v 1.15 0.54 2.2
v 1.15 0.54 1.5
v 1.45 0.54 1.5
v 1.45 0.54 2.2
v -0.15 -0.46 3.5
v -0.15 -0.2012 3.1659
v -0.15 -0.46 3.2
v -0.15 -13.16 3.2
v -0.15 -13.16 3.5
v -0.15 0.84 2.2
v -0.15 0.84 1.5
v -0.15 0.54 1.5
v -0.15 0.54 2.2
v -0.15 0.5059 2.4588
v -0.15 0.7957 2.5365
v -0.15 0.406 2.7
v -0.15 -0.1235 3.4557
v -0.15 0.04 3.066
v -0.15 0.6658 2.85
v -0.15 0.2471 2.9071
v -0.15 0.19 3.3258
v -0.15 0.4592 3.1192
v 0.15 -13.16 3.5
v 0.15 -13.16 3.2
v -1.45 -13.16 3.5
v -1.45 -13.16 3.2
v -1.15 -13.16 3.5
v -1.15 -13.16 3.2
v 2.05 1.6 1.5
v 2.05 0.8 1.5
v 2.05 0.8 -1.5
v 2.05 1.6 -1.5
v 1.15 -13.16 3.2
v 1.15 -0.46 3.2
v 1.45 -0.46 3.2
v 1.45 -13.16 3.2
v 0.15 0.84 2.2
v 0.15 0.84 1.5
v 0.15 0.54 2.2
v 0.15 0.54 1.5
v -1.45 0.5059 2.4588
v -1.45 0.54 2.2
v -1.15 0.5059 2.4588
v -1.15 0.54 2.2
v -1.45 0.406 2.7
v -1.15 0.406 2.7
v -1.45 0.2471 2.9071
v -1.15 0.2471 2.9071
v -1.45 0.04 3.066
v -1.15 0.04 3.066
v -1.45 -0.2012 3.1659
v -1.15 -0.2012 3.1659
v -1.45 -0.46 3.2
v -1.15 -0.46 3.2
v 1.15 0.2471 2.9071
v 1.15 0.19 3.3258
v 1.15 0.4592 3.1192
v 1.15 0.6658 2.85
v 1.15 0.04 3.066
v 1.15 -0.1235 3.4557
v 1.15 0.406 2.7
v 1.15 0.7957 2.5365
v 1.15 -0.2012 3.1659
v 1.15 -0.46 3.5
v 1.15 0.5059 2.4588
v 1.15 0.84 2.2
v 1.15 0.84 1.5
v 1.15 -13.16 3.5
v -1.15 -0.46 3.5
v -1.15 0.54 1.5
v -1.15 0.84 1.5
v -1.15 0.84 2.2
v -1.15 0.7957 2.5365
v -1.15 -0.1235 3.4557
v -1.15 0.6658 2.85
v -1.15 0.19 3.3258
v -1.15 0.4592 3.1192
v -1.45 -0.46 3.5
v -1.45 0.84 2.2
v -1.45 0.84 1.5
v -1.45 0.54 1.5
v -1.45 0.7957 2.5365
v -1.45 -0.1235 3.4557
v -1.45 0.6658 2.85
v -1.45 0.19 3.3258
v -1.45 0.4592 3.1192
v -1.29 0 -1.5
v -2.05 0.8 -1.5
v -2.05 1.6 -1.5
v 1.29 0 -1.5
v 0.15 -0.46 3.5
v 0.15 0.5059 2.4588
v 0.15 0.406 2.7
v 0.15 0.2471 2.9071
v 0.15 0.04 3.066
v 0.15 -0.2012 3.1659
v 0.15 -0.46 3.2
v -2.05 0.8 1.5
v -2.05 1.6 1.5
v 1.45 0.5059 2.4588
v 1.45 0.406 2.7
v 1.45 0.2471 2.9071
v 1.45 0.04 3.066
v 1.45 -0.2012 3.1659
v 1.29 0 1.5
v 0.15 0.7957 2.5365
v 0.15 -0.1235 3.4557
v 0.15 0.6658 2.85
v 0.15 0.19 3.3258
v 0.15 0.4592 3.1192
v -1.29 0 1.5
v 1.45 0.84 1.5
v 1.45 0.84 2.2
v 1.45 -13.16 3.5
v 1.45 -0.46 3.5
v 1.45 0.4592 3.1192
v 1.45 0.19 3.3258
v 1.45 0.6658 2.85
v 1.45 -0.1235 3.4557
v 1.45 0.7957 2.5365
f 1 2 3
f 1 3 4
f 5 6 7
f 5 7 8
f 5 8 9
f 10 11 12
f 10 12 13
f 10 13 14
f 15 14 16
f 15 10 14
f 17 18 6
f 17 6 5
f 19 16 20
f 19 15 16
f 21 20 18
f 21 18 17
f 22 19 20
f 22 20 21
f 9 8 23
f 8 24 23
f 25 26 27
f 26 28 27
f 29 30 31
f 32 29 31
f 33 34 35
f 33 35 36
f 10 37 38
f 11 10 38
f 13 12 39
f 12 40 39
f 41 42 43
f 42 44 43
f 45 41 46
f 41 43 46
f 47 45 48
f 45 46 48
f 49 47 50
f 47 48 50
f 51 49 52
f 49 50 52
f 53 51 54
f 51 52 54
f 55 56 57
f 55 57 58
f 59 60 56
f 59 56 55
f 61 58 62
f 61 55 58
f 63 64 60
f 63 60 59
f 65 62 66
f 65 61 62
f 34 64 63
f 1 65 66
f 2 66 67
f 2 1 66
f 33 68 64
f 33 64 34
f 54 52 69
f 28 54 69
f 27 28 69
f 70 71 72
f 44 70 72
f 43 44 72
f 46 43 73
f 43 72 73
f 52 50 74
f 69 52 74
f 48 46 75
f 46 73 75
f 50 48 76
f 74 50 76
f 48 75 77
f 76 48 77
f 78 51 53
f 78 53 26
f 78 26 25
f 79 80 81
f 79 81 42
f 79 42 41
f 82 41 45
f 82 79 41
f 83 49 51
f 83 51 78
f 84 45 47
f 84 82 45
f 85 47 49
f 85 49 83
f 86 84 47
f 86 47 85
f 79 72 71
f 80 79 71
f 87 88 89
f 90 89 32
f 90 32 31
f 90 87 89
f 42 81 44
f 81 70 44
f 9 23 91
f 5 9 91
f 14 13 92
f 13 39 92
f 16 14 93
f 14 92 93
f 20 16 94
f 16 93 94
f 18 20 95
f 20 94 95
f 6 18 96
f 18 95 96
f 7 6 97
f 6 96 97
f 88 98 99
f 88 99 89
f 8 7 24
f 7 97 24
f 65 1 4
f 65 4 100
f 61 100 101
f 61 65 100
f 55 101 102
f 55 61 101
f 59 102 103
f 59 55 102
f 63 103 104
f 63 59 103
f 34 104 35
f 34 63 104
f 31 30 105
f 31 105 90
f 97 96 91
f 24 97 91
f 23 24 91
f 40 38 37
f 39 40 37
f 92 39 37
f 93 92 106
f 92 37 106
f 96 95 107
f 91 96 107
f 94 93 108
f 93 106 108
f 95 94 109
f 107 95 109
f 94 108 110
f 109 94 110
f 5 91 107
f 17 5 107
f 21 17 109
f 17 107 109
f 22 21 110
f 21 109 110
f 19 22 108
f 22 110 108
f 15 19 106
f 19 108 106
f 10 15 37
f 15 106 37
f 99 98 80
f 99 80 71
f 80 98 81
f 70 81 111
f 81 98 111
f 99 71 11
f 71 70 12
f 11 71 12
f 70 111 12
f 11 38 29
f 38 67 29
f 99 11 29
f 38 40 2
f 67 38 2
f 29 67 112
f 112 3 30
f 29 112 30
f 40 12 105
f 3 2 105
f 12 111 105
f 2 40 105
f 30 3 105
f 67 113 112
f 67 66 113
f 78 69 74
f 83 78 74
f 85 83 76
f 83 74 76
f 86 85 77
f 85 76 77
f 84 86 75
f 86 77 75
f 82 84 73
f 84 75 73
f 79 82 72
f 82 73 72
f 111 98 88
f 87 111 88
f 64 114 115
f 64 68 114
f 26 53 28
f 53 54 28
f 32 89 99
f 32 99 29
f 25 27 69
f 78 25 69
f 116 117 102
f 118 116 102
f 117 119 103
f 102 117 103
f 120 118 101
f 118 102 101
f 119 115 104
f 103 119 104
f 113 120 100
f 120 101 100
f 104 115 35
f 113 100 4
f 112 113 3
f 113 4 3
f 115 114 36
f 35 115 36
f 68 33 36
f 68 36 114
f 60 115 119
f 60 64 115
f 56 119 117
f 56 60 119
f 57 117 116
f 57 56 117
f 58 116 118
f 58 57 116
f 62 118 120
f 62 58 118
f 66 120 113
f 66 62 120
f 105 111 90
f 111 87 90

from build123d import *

# Parameters (mm, degrees)
SKETCH_1_W             = 4.1
SKETCH_1_H             = 3
EXTRUDE_1_DEPTH        = 1.6
CHAMFER_1_SIZE         = 0.76
CHAMFER_1_SIZE2        = 0.8
EXTRUDE_2_DEPTH        = 0.15
PATTERN_LINEAR_1_COUNT = 2
PATTERN_LINEAR_1_PITCH = 1.3
MIRROR_1_COPY_1_DEPTH  = 0.15
MIRROR_1_COPY_2_DEPTH  = 0.15


with BuildPart() as part:
    # Эскиз1 → Бобышка-Вытянуть1 (new body)
    with BuildSketch(Plane(origin=(0, 0, 0), x_dir=(1, 0, 0), z_dir=(0, 1, 0))):
        Rectangle(SKETCH_1_W, SKETCH_1_H)
    extrude(amount=EXTRUDE_1_DEPTH)

    # Фаска1
    chamfer_1_edges = [part.edges().sort_by_distance(p)[0] for p in [
        (2.05, 0, 0),
        (-2.05, 0, 0),
    ]]
    chamfer_1_side = [part.faces().sort_by_distance(p)[0] for p in [
        (0, 0, 0),
    ]]
    chamfer(chamfer_1_edges, length=CHAMFER_1_SIZE, length2=CHAMFER_1_SIZE2, reference=chamfer_1_side[0])

    # Эскиз2 → Бобышка-Вытянуть2 (add, symmetric)
    with BuildSketch(Plane(origin=(0, 0, 0), x_dir=(0, 0, -1), z_dir=(1, 0, 0))):
        with BuildLine():
            Line((-2.2, 0.84), (-1.5, 0.84))
            Line((-1.5, 0.84), (-1.5, 0.54))
            Line((-1.5, 0.54), (-2.2, 0.54))
            ThreePointArc((-2.2, 0.54), (-2.907106781, 0.247106781), (-3.2, -0.46))
            Line((-3.2, -0.46), (-3.2, -13.16))
            Line((-3.2, -13.16), (-3.5, -13.16))
            Line((-3.5, -13.16), (-3.5, -0.46))
            ThreePointArc((-3.5, -0.46), (-3.119238816, 0.459238816), (-2.2, 0.84))
        make_face()
    extrude_2 = extrude(amount=EXTRUDE_2_DEPTH, both=True)

    # Линейный массив1: Бобышка-Вытянуть2 ×2
    with Locations(*[(-i * PATTERN_LINEAR_1_PITCH, 0, 0) for i in range(1, PATTERN_LINEAR_1_COUNT)]):
        add(extrude_2)

    # Зеркальное отражение1 copy 1 sketch → Зеркальное отражение1 copy 1 (add, symmetric)
    with BuildSketch(Plane(origin=(1.3, 0, 0), x_dir=(0, 0, -1), z_dir=(-1, 0, 0))):
        with BuildLine():
            Line((-2.2, -0.84), (-1.5, -0.84))
            Line((-1.5, -0.84), (-1.5, -0.54))
            Line((-1.5, -0.54), (-2.2, -0.54))
            ThreePointArc((-2.2, -0.54), (-2.907106781, -0.247106781), (-3.2, 0.46))
            Line((-3.2, 0.46), (-3.2, 13.16))
            Line((-3.2, 13.16), (-3.5, 13.16))
            Line((-3.5, 13.16), (-3.5, 0.46))
            ThreePointArc((-3.5, 0.46), (-3.119238816, -0.459238816), (-2.2, -0.84))
        make_face()
    extrude(amount=MIRROR_1_COPY_1_DEPTH, both=True)

    # Зеркальное отражение1 copy 2 sketch → Зеркальное отражение1 copy 2 (add, symmetric)
    with BuildSketch(Plane(origin=(0, 0, 0), x_dir=(0, 0, -1), z_dir=(-1, 0, 0))):
        with BuildLine():
            Line((-2.2, -0.84), (-1.5, -0.84))
            Line((-1.5, -0.84), (-1.5, -0.54))
            Line((-1.5, -0.54), (-2.2, -0.54))
            ThreePointArc((-2.2, -0.54), (-2.907106781, -0.247106781), (-3.2, 0.46))
            Line((-3.2, 0.46), (-3.2, 13.16))
            Line((-3.2, 13.16), (-3.5, 13.16))
            Line((-3.5, 13.16), (-3.5, 0.46))
            ThreePointArc((-3.5, 0.46), (-3.119238816, -0.459238816), (-2.2, -0.84))
        make_face()
    extrude(amount=MIRROR_1_COPY_2_DEPTH, both=True)


solid = part.part
